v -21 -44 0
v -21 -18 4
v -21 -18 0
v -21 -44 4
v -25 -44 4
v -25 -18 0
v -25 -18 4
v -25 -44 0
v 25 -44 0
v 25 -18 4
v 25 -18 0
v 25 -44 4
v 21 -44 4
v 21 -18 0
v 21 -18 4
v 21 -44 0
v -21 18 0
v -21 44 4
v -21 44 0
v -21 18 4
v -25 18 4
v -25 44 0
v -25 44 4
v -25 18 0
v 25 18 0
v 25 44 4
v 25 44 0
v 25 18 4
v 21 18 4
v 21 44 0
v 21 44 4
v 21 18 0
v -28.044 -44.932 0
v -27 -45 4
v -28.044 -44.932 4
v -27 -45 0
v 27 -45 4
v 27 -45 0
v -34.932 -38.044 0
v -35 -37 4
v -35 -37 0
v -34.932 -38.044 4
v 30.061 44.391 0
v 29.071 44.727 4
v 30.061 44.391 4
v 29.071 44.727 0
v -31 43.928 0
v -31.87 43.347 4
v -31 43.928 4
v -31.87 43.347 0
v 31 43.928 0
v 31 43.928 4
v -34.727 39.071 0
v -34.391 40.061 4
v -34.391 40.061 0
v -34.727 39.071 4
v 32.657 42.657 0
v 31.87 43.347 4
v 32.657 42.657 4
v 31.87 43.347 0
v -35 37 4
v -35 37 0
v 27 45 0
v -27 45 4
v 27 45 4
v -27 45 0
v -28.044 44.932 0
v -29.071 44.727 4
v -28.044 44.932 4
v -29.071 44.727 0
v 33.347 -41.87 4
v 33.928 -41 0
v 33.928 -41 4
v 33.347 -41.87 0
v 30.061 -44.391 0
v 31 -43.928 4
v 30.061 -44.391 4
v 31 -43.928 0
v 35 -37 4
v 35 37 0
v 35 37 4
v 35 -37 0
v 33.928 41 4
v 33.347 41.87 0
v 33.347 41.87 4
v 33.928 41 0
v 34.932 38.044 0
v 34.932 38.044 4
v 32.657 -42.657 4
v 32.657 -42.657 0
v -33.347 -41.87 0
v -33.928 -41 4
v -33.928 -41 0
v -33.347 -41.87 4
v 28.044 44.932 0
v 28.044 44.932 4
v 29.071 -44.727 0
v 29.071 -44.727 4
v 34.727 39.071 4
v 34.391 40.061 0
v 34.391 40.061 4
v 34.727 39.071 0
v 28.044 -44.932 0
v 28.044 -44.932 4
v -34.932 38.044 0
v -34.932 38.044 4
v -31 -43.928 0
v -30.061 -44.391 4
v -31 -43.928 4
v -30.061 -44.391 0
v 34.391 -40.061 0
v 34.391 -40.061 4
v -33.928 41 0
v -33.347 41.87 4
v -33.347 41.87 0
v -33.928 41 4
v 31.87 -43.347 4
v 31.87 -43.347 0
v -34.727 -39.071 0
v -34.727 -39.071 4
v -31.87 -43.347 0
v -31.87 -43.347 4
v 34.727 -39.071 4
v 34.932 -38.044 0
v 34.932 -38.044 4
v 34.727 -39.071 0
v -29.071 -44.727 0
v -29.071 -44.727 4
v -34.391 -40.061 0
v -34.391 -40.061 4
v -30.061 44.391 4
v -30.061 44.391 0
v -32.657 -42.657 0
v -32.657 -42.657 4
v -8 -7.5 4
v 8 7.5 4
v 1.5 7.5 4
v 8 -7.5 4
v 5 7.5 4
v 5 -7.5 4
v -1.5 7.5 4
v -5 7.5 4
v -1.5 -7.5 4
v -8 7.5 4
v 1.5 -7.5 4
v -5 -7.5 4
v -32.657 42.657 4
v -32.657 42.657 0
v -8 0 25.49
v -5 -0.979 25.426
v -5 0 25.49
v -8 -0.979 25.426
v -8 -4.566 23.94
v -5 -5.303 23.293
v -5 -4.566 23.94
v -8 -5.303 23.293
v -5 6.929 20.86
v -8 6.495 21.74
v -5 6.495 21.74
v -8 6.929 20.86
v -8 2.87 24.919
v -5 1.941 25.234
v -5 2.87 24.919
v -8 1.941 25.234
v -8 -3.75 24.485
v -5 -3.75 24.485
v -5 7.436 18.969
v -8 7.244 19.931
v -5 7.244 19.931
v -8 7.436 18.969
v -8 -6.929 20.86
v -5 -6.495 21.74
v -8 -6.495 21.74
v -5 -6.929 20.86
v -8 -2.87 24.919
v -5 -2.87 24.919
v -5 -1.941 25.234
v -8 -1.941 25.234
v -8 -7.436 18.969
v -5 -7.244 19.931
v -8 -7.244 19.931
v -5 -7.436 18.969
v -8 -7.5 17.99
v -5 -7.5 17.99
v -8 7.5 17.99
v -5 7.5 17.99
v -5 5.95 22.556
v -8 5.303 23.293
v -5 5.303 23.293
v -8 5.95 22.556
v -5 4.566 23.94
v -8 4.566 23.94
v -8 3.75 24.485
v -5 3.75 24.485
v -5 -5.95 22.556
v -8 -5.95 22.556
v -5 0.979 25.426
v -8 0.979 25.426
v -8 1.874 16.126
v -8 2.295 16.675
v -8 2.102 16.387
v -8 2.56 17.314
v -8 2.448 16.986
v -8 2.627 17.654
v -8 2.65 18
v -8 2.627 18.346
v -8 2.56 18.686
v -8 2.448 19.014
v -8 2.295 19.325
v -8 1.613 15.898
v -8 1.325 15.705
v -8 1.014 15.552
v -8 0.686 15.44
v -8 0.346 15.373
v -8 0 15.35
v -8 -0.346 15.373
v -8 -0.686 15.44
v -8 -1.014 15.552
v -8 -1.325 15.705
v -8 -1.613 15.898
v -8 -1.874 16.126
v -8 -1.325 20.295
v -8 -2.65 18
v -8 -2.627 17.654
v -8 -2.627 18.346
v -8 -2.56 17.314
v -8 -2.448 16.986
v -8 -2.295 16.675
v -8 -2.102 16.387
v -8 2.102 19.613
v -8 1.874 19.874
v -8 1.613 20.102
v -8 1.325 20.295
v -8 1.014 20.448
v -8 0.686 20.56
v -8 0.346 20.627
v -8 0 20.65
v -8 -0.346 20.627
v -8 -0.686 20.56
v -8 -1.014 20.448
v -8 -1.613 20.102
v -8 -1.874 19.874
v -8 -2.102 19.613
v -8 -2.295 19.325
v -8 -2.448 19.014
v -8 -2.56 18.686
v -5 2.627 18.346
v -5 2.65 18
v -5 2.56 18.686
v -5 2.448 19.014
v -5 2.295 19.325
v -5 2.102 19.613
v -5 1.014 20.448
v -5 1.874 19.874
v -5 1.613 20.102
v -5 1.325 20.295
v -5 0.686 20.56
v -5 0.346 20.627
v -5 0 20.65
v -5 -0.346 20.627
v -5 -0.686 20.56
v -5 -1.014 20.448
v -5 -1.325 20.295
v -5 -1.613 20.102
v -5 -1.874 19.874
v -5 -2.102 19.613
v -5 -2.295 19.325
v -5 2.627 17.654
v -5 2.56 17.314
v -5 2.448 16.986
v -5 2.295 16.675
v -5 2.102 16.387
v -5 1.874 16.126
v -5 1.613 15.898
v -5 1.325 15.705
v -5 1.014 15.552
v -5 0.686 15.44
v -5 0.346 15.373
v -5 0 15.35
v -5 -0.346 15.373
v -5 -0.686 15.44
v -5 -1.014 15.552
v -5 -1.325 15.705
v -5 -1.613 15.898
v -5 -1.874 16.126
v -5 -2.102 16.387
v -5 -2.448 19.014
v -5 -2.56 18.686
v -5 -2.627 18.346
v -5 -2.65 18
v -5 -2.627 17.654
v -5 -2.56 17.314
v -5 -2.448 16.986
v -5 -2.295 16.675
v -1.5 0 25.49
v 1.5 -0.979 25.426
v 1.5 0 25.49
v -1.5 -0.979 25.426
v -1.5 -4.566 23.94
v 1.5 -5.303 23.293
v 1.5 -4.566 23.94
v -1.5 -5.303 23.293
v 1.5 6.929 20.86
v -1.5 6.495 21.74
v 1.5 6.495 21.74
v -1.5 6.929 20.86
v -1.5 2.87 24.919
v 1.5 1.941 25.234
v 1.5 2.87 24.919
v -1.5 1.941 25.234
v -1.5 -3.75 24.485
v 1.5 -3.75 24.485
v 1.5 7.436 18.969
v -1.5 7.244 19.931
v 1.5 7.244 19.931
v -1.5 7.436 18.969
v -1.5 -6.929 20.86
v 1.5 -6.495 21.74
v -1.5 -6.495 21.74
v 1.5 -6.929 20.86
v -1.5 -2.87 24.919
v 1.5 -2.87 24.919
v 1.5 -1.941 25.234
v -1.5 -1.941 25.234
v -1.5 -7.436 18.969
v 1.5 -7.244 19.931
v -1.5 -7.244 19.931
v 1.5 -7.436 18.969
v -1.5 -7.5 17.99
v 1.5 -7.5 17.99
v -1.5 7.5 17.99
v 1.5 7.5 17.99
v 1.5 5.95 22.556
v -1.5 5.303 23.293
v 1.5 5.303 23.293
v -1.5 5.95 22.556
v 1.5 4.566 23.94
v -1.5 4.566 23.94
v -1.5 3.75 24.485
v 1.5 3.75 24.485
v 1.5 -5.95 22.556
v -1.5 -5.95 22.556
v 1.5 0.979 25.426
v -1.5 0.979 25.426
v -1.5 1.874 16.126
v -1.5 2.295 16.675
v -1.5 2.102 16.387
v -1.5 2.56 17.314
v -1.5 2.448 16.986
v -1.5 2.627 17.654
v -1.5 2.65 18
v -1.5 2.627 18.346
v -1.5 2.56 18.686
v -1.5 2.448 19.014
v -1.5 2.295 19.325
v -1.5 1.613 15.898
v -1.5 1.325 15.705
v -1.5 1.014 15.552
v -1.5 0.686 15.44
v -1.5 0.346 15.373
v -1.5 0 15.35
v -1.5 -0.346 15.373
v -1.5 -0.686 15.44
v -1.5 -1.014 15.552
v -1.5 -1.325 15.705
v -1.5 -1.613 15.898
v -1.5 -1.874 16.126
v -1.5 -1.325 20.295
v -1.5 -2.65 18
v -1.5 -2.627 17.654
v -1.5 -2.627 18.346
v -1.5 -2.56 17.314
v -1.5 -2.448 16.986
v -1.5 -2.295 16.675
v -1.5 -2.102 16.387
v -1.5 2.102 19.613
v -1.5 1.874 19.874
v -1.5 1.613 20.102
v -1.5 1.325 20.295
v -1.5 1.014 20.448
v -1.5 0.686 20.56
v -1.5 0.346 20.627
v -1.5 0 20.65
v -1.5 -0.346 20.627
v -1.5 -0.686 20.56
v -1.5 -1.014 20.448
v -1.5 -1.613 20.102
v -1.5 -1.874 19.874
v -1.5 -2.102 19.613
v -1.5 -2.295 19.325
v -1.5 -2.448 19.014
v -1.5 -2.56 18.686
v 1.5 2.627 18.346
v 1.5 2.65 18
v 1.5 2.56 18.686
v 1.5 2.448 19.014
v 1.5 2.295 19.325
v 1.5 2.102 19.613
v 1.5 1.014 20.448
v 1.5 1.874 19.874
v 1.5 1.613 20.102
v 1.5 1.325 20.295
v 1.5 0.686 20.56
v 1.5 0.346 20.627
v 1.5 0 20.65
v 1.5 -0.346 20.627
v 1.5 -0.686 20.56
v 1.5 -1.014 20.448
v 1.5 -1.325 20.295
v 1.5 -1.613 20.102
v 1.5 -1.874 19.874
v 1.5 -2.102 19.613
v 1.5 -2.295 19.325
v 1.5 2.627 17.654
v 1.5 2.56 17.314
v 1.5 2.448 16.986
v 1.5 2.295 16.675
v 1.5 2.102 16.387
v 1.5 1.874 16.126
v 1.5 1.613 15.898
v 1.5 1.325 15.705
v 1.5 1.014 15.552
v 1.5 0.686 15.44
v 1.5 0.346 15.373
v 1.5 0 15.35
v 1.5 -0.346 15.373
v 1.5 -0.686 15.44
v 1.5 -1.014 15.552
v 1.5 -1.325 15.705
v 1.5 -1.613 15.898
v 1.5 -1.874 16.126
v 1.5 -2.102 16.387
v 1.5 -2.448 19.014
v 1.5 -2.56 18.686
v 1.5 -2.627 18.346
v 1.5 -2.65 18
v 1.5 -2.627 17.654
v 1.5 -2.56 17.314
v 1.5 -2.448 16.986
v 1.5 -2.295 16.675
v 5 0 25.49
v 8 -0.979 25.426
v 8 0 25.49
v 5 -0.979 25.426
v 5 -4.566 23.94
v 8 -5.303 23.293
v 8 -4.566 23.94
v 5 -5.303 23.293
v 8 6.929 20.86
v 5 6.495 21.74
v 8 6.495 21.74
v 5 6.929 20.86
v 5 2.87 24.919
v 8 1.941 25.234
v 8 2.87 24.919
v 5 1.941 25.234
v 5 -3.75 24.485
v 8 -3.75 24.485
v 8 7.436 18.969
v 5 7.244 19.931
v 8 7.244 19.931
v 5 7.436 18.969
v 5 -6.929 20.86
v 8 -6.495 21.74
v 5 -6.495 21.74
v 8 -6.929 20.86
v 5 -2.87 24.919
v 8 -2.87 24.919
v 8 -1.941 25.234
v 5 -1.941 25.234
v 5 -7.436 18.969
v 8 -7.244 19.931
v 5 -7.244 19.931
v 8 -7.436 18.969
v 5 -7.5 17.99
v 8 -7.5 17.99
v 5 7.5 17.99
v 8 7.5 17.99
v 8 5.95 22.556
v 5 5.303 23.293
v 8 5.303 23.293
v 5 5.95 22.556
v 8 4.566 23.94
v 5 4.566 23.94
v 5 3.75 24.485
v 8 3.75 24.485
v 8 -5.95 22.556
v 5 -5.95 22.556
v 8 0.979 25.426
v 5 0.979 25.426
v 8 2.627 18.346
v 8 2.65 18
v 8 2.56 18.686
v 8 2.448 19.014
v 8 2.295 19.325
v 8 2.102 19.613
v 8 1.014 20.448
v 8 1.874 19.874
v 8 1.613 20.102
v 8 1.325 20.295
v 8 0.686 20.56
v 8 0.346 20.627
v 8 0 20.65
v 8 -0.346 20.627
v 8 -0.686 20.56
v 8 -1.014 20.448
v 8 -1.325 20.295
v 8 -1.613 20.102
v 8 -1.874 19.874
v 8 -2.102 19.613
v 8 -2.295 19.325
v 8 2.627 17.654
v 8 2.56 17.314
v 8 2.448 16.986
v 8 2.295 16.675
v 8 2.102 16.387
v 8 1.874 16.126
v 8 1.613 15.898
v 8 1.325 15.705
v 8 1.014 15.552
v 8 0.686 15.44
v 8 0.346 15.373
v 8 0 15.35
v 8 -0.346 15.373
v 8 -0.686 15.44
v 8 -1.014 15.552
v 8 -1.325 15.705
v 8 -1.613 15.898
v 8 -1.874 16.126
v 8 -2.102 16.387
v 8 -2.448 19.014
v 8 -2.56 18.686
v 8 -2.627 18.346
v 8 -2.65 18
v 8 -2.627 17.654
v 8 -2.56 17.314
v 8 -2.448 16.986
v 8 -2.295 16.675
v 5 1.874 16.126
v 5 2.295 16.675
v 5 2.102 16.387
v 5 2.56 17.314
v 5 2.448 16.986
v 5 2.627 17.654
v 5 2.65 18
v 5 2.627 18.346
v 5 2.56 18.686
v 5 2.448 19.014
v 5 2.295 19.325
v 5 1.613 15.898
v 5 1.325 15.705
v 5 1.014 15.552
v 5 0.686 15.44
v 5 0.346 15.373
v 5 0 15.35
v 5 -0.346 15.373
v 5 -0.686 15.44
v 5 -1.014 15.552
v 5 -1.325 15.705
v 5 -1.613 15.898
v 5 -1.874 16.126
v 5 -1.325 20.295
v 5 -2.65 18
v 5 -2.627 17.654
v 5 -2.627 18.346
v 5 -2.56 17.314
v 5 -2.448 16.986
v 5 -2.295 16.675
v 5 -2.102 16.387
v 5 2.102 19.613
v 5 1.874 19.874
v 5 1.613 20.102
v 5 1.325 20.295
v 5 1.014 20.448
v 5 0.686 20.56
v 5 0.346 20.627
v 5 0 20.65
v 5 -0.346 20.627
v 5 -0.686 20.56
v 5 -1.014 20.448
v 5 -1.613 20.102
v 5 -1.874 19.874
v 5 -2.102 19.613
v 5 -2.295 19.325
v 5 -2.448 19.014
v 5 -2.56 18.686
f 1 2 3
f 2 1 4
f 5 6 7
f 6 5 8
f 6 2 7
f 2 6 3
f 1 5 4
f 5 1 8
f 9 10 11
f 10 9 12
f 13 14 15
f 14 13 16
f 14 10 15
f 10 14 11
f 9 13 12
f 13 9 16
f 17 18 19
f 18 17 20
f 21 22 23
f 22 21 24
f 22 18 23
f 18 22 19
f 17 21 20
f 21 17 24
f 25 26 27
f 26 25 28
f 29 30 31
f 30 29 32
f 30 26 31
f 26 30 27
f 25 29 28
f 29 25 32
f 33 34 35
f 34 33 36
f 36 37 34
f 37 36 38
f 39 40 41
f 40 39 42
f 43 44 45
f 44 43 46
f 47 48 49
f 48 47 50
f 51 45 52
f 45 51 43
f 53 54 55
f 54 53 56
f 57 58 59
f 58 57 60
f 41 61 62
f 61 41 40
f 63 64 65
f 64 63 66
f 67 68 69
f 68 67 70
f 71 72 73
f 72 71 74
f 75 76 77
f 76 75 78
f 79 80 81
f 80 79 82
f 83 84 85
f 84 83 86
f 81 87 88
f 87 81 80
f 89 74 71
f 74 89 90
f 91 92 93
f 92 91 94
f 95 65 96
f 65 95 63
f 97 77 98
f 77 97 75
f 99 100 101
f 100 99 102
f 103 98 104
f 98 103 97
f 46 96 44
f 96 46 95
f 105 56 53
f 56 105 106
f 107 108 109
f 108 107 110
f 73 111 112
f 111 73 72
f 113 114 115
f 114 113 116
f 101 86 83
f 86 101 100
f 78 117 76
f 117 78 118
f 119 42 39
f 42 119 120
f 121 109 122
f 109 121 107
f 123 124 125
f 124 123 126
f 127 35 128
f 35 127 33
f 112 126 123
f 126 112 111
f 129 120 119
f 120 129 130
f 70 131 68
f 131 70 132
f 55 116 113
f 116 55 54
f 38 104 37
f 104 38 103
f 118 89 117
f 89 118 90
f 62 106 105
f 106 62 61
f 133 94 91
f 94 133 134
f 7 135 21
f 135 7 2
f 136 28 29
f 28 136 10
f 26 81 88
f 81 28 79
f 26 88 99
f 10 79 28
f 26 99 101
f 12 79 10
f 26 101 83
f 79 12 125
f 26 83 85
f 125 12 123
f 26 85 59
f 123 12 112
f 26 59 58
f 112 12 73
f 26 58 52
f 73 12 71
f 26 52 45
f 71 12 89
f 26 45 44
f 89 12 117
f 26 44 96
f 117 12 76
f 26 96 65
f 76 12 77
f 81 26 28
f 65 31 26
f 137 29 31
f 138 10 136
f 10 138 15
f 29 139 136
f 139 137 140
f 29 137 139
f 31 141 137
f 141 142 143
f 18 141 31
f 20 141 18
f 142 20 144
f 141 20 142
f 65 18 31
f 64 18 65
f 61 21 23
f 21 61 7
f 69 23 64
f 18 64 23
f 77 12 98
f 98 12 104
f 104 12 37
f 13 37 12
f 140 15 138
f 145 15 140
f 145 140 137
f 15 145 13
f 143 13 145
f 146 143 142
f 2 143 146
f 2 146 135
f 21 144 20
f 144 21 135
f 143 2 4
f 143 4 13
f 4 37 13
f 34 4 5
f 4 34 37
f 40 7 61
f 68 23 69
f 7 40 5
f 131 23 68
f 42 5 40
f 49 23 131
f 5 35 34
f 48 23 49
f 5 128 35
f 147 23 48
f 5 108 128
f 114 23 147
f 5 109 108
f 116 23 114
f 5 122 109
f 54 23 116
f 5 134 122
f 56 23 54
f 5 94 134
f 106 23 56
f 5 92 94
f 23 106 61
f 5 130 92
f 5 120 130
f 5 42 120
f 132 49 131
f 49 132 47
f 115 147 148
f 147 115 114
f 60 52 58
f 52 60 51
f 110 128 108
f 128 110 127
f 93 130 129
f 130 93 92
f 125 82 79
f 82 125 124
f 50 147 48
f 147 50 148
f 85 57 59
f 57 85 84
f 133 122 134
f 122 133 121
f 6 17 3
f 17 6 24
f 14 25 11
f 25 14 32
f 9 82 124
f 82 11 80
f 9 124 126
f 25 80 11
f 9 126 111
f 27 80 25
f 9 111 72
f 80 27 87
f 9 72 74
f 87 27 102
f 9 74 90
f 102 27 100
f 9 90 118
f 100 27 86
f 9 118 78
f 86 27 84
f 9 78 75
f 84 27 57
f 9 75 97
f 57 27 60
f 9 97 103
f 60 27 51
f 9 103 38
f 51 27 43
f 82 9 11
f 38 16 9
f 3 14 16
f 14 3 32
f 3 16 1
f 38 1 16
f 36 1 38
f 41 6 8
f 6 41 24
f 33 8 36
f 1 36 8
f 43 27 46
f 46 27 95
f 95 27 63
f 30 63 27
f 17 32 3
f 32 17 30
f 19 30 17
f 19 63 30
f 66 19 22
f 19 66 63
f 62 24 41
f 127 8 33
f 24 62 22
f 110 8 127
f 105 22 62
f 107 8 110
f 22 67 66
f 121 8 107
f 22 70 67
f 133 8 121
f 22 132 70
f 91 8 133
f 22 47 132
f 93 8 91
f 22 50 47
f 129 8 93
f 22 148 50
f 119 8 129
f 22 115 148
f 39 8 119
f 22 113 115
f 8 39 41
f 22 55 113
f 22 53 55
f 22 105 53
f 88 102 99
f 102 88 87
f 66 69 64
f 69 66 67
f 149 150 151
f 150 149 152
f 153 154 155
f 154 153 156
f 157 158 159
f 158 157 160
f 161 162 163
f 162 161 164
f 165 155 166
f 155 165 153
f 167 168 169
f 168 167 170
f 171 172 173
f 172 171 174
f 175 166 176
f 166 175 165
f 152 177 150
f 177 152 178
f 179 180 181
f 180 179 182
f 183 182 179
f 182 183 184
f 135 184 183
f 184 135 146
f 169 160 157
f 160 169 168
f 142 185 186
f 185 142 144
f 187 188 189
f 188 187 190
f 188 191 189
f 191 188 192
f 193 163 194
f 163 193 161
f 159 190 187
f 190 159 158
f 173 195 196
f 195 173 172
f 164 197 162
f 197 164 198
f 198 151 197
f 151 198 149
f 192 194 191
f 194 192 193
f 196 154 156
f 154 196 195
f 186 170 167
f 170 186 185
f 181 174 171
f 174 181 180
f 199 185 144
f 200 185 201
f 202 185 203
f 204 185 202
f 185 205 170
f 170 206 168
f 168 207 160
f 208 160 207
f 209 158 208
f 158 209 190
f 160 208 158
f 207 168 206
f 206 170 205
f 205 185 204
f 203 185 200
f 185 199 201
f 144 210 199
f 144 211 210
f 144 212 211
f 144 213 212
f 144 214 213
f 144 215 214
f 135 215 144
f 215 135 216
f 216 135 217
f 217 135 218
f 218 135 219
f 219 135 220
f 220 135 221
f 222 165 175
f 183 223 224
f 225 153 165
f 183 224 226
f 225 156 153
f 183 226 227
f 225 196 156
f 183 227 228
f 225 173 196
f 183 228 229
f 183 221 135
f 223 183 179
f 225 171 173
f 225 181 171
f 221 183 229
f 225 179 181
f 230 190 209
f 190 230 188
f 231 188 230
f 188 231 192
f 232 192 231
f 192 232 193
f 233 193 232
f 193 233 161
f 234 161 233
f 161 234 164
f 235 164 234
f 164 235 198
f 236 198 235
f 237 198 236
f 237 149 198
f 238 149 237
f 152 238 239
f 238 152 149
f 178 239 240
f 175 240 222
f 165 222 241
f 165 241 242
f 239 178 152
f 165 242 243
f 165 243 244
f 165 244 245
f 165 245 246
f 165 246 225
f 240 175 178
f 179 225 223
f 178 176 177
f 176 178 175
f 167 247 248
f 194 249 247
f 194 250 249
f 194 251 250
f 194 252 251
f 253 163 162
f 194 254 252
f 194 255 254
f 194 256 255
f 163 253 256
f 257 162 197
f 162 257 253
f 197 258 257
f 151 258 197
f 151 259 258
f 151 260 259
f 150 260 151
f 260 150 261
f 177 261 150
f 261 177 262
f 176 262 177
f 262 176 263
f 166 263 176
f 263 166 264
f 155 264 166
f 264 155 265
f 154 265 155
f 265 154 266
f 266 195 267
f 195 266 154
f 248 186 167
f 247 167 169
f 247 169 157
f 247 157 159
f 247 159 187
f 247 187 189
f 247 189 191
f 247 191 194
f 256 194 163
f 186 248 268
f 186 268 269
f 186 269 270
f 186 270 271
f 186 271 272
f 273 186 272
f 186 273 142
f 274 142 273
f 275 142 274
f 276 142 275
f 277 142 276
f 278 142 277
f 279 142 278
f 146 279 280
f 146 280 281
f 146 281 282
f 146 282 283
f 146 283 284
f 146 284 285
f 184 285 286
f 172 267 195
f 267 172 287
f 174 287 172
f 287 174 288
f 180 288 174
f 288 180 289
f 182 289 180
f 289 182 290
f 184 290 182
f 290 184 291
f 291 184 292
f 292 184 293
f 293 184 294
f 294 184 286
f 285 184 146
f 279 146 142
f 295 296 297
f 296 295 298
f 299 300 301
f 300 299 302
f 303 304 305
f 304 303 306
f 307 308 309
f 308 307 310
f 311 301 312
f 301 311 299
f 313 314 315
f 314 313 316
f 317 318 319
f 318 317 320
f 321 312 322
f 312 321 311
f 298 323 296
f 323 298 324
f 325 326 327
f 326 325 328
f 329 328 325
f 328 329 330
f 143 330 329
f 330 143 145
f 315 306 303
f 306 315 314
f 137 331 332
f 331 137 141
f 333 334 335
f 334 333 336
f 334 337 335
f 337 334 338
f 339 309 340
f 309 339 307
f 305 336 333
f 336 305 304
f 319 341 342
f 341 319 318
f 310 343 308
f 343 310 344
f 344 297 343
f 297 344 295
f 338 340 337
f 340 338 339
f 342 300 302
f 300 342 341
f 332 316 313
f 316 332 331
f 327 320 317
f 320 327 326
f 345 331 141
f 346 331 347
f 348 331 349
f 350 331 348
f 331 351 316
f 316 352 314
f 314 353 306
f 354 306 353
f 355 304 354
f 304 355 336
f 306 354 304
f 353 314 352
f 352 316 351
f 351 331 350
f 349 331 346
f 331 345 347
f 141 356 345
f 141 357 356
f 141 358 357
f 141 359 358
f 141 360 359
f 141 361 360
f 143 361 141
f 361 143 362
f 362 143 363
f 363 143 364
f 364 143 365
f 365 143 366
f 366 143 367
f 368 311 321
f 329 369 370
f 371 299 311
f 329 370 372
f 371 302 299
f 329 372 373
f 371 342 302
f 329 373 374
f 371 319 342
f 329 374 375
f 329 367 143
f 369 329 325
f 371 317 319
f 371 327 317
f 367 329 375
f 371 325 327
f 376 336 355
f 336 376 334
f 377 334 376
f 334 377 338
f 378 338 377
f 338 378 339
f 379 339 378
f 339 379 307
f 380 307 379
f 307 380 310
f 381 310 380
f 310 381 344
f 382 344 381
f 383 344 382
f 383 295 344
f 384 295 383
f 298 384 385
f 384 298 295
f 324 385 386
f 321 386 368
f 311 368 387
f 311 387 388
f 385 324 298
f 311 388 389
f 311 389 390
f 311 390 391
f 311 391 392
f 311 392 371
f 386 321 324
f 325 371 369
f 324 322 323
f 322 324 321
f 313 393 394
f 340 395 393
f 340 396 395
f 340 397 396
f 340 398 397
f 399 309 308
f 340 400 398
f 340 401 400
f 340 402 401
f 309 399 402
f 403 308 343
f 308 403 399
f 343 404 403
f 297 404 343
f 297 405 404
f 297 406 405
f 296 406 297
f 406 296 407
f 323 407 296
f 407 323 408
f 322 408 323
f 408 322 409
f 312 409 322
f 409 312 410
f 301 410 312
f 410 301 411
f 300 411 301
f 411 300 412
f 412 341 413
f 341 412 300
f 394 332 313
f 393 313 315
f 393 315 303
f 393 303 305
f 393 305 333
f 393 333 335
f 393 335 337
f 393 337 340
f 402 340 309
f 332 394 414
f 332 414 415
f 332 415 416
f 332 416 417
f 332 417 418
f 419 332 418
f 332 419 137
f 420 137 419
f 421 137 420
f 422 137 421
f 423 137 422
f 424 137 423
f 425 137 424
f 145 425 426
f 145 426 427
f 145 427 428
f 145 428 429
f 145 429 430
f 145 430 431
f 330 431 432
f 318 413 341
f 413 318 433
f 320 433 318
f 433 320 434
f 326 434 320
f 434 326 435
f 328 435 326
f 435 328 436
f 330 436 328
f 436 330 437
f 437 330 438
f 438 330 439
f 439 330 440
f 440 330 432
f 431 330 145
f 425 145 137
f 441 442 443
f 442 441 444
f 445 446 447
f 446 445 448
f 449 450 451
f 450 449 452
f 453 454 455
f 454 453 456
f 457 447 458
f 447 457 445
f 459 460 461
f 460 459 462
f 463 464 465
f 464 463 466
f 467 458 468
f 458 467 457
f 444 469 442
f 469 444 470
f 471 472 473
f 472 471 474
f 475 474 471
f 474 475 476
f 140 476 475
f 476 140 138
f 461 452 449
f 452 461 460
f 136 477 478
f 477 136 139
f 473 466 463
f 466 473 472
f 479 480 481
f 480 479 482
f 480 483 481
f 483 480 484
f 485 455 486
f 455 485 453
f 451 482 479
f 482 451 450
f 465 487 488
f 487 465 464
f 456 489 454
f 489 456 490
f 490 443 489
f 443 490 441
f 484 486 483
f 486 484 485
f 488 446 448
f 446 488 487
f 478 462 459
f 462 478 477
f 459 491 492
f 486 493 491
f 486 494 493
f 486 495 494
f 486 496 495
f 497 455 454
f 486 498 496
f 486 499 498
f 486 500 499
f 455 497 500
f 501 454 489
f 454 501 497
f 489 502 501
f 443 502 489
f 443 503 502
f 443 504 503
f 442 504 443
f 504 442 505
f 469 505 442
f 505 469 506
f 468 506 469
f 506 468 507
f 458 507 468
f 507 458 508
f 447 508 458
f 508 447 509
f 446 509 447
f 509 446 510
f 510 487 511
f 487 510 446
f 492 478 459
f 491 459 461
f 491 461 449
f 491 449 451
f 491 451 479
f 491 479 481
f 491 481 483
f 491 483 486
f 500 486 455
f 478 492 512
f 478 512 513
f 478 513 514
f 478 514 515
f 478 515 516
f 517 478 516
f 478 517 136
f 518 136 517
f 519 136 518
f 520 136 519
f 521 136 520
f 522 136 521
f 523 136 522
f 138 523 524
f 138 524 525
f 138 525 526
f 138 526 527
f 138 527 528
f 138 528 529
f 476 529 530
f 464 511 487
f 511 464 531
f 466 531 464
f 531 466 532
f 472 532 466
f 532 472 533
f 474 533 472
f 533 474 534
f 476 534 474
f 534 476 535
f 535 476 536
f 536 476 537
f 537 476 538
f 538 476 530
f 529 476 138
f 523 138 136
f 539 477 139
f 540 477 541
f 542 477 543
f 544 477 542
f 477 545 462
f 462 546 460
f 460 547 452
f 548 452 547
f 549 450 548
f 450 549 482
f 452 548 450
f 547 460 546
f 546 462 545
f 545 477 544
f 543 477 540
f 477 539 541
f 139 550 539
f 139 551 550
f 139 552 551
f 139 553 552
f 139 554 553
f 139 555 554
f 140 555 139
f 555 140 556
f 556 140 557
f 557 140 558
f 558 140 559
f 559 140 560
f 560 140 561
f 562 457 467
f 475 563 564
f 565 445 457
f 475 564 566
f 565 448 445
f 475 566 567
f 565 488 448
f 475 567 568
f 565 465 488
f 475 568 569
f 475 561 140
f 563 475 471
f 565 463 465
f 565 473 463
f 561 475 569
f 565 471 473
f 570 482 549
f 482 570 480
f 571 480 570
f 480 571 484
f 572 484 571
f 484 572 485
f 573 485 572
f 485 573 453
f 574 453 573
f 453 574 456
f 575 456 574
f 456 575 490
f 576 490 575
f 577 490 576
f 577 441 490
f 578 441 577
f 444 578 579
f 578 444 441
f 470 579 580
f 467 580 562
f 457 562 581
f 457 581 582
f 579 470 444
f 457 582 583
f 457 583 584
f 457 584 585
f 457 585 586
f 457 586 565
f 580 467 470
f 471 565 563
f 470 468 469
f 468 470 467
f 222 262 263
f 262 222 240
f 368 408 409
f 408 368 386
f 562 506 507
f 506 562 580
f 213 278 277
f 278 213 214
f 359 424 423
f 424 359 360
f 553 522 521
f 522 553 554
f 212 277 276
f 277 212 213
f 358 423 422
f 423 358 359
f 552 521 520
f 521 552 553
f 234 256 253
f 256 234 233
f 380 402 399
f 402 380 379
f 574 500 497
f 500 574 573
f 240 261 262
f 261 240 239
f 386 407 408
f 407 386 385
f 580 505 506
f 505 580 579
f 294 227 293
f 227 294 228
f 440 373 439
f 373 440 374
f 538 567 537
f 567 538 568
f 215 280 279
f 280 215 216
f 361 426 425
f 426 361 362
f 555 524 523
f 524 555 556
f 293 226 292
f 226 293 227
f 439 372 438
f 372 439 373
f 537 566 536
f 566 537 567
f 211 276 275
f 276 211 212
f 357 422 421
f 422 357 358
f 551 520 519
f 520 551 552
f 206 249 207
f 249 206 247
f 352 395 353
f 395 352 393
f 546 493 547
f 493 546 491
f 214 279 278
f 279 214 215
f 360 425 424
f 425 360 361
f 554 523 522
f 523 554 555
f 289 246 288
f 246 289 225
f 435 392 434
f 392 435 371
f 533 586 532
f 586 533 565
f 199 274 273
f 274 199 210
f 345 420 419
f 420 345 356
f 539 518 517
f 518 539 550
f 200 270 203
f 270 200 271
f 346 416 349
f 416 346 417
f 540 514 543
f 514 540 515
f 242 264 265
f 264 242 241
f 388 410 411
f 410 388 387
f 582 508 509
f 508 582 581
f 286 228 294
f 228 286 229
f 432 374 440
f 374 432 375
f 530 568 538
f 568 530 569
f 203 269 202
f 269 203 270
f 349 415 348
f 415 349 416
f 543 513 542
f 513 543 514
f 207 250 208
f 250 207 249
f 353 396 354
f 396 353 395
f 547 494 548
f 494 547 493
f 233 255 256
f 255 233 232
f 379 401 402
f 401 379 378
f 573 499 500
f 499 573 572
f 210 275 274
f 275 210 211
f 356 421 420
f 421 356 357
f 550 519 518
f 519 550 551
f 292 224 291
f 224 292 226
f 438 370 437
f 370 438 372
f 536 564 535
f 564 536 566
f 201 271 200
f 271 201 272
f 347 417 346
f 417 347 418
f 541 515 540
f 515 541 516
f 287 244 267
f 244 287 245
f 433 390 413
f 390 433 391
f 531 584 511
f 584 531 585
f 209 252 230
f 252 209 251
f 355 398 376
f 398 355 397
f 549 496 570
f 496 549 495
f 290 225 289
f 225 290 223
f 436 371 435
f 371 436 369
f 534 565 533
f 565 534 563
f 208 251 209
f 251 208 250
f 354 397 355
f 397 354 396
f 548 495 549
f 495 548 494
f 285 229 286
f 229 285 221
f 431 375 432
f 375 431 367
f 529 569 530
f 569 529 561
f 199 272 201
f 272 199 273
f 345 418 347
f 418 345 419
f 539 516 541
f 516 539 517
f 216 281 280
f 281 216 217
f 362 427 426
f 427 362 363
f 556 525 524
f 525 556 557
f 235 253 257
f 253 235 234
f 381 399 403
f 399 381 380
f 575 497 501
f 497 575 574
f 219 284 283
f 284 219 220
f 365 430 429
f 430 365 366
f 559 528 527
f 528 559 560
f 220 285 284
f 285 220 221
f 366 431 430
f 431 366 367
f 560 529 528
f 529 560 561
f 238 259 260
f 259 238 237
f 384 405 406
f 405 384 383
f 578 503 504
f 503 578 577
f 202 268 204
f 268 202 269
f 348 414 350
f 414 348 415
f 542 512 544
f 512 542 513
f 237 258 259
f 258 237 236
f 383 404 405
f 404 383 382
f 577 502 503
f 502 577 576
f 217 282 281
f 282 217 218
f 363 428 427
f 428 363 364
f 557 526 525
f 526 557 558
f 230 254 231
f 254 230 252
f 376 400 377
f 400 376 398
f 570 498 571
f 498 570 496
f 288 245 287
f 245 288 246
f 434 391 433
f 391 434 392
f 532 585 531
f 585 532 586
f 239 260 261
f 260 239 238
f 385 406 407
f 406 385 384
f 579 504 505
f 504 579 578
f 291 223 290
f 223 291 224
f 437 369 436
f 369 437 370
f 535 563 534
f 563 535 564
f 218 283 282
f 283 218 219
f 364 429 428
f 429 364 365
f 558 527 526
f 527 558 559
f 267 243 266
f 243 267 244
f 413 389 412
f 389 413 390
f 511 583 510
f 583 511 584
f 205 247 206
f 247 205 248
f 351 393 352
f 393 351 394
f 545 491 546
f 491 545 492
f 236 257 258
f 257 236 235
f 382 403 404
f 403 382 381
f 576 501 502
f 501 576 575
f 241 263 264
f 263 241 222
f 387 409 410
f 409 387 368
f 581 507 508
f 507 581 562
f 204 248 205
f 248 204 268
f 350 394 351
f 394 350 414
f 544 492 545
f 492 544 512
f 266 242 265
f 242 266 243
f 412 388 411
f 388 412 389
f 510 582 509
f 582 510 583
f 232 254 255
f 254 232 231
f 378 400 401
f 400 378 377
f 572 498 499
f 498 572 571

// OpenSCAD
// chest_plate.scad — flat chest/lanyard plate with a GoPro-style 3-prong mount
// so the jackw01 phone clamp (2-prong male) snaps on. Hedge against motion blur on the cane.
// DRAFT: unrendered. Check prong spacing against your printed phone clamp before relying on it.
// Print: flat, PETG, no supports.
// LEGACY (ESP32 era, cut 2026-09-10 when the app went phone-only): do not print for the demo.
// Sized for a 12.7 mm aluminium/graphite shaft; the prototype stick is 27.65 mm (measured
// 2026-09-12), so nothing here fits it. The live mount is hardware/mount_screwless/ (see
// cad/README.md and hardware/README.md). Not rendered by any script (scripts/build_stl.ps1 covers
// hardware/ only); no tests; no owner on the current team. Units: millimetres throughout.
// Why it existed: the plan's hedge if the phone on the cane blurred too much — the same GoPro-knuckle
// phone holder snaps onto the chest instead (docs/ideas.md "Hedge": a 2025 study measured cane-mounted
// camera tracking at 55-58 % outdoors vs > 98 % head-mounted). Never printed or tested; the
// phone-only app assumes the cane mount.

// Circle facets for every cylinder in this file.
$fn = 48;
// Plate outline (width, height, thickness, corner radius), mm.
plate_w = 70; plate_h = 90; plate_t = 4; corner_r = 8;
// Four strap slots: slot length (a 25 mm webbing strap passes through it) and slot width, mm.
slot_w = 26; slot_h = 4;      // 25 mm webbing
// GoPro-style prongs: thickness, gap between prongs, height to the bolt axis, rounded-end radius,
// and the clearance hole for the M5 thumb screw. Unverified against a real GoPro accessory.
prong_t = 3; prong_gap = 3.5; prong_h = 14; prong_r = 7.5; bolt_d = 5.3;
prongs = 3;                   // 3 = base (female) mates with 2-prong accessories

// Rounded-rectangle base plate lying on z = 0.
module plate() {
    hull() for (x = [-1,1], y = [-1,1])
        translate([x*(plate_w/2 - corner_r), y*(plate_h/2 - corner_r), 0]) cylinder(r = corner_r, h = plate_t);
}
// Through-cutters for the four strap slots, two near each long edge.
module slots() {
    for (y = [-1, 1]) for (x = [-1, 1])
        translate([x*(plate_w/2 - 12) - slot_h/2, y*(plate_h/2 - 14) - slot_w/2, -1])
            cube([slot_h, slot_w, plate_t + 2]);
}
// The prongs standing on the plate's top face, with the shared bolt hole through their rounded ends.
module prong_set() {
    total = prongs*prong_t + (prongs-1)*prong_gap;
    difference() {
        union() for (i = [0:prongs-1])
            translate([-total/2 + i*(prong_t + prong_gap), 0, plate_t - 0.01])
                hull() {
                    translate([0, -prong_r, 0]) cube([prong_t, 2*prong_r, 0.01]);
                    translate([0, 0, prong_h]) rotate([0, 90, 0]) cylinder(r = prong_r, h = prong_t);
                }
        translate([-total/2 - 1, 0, plate_t + prong_h]) rotate([0, 90, 0]) cylinder(d = bolt_d, h = total + 2);
    }
}
difference() { plate(); slots(); }
prong_set();
